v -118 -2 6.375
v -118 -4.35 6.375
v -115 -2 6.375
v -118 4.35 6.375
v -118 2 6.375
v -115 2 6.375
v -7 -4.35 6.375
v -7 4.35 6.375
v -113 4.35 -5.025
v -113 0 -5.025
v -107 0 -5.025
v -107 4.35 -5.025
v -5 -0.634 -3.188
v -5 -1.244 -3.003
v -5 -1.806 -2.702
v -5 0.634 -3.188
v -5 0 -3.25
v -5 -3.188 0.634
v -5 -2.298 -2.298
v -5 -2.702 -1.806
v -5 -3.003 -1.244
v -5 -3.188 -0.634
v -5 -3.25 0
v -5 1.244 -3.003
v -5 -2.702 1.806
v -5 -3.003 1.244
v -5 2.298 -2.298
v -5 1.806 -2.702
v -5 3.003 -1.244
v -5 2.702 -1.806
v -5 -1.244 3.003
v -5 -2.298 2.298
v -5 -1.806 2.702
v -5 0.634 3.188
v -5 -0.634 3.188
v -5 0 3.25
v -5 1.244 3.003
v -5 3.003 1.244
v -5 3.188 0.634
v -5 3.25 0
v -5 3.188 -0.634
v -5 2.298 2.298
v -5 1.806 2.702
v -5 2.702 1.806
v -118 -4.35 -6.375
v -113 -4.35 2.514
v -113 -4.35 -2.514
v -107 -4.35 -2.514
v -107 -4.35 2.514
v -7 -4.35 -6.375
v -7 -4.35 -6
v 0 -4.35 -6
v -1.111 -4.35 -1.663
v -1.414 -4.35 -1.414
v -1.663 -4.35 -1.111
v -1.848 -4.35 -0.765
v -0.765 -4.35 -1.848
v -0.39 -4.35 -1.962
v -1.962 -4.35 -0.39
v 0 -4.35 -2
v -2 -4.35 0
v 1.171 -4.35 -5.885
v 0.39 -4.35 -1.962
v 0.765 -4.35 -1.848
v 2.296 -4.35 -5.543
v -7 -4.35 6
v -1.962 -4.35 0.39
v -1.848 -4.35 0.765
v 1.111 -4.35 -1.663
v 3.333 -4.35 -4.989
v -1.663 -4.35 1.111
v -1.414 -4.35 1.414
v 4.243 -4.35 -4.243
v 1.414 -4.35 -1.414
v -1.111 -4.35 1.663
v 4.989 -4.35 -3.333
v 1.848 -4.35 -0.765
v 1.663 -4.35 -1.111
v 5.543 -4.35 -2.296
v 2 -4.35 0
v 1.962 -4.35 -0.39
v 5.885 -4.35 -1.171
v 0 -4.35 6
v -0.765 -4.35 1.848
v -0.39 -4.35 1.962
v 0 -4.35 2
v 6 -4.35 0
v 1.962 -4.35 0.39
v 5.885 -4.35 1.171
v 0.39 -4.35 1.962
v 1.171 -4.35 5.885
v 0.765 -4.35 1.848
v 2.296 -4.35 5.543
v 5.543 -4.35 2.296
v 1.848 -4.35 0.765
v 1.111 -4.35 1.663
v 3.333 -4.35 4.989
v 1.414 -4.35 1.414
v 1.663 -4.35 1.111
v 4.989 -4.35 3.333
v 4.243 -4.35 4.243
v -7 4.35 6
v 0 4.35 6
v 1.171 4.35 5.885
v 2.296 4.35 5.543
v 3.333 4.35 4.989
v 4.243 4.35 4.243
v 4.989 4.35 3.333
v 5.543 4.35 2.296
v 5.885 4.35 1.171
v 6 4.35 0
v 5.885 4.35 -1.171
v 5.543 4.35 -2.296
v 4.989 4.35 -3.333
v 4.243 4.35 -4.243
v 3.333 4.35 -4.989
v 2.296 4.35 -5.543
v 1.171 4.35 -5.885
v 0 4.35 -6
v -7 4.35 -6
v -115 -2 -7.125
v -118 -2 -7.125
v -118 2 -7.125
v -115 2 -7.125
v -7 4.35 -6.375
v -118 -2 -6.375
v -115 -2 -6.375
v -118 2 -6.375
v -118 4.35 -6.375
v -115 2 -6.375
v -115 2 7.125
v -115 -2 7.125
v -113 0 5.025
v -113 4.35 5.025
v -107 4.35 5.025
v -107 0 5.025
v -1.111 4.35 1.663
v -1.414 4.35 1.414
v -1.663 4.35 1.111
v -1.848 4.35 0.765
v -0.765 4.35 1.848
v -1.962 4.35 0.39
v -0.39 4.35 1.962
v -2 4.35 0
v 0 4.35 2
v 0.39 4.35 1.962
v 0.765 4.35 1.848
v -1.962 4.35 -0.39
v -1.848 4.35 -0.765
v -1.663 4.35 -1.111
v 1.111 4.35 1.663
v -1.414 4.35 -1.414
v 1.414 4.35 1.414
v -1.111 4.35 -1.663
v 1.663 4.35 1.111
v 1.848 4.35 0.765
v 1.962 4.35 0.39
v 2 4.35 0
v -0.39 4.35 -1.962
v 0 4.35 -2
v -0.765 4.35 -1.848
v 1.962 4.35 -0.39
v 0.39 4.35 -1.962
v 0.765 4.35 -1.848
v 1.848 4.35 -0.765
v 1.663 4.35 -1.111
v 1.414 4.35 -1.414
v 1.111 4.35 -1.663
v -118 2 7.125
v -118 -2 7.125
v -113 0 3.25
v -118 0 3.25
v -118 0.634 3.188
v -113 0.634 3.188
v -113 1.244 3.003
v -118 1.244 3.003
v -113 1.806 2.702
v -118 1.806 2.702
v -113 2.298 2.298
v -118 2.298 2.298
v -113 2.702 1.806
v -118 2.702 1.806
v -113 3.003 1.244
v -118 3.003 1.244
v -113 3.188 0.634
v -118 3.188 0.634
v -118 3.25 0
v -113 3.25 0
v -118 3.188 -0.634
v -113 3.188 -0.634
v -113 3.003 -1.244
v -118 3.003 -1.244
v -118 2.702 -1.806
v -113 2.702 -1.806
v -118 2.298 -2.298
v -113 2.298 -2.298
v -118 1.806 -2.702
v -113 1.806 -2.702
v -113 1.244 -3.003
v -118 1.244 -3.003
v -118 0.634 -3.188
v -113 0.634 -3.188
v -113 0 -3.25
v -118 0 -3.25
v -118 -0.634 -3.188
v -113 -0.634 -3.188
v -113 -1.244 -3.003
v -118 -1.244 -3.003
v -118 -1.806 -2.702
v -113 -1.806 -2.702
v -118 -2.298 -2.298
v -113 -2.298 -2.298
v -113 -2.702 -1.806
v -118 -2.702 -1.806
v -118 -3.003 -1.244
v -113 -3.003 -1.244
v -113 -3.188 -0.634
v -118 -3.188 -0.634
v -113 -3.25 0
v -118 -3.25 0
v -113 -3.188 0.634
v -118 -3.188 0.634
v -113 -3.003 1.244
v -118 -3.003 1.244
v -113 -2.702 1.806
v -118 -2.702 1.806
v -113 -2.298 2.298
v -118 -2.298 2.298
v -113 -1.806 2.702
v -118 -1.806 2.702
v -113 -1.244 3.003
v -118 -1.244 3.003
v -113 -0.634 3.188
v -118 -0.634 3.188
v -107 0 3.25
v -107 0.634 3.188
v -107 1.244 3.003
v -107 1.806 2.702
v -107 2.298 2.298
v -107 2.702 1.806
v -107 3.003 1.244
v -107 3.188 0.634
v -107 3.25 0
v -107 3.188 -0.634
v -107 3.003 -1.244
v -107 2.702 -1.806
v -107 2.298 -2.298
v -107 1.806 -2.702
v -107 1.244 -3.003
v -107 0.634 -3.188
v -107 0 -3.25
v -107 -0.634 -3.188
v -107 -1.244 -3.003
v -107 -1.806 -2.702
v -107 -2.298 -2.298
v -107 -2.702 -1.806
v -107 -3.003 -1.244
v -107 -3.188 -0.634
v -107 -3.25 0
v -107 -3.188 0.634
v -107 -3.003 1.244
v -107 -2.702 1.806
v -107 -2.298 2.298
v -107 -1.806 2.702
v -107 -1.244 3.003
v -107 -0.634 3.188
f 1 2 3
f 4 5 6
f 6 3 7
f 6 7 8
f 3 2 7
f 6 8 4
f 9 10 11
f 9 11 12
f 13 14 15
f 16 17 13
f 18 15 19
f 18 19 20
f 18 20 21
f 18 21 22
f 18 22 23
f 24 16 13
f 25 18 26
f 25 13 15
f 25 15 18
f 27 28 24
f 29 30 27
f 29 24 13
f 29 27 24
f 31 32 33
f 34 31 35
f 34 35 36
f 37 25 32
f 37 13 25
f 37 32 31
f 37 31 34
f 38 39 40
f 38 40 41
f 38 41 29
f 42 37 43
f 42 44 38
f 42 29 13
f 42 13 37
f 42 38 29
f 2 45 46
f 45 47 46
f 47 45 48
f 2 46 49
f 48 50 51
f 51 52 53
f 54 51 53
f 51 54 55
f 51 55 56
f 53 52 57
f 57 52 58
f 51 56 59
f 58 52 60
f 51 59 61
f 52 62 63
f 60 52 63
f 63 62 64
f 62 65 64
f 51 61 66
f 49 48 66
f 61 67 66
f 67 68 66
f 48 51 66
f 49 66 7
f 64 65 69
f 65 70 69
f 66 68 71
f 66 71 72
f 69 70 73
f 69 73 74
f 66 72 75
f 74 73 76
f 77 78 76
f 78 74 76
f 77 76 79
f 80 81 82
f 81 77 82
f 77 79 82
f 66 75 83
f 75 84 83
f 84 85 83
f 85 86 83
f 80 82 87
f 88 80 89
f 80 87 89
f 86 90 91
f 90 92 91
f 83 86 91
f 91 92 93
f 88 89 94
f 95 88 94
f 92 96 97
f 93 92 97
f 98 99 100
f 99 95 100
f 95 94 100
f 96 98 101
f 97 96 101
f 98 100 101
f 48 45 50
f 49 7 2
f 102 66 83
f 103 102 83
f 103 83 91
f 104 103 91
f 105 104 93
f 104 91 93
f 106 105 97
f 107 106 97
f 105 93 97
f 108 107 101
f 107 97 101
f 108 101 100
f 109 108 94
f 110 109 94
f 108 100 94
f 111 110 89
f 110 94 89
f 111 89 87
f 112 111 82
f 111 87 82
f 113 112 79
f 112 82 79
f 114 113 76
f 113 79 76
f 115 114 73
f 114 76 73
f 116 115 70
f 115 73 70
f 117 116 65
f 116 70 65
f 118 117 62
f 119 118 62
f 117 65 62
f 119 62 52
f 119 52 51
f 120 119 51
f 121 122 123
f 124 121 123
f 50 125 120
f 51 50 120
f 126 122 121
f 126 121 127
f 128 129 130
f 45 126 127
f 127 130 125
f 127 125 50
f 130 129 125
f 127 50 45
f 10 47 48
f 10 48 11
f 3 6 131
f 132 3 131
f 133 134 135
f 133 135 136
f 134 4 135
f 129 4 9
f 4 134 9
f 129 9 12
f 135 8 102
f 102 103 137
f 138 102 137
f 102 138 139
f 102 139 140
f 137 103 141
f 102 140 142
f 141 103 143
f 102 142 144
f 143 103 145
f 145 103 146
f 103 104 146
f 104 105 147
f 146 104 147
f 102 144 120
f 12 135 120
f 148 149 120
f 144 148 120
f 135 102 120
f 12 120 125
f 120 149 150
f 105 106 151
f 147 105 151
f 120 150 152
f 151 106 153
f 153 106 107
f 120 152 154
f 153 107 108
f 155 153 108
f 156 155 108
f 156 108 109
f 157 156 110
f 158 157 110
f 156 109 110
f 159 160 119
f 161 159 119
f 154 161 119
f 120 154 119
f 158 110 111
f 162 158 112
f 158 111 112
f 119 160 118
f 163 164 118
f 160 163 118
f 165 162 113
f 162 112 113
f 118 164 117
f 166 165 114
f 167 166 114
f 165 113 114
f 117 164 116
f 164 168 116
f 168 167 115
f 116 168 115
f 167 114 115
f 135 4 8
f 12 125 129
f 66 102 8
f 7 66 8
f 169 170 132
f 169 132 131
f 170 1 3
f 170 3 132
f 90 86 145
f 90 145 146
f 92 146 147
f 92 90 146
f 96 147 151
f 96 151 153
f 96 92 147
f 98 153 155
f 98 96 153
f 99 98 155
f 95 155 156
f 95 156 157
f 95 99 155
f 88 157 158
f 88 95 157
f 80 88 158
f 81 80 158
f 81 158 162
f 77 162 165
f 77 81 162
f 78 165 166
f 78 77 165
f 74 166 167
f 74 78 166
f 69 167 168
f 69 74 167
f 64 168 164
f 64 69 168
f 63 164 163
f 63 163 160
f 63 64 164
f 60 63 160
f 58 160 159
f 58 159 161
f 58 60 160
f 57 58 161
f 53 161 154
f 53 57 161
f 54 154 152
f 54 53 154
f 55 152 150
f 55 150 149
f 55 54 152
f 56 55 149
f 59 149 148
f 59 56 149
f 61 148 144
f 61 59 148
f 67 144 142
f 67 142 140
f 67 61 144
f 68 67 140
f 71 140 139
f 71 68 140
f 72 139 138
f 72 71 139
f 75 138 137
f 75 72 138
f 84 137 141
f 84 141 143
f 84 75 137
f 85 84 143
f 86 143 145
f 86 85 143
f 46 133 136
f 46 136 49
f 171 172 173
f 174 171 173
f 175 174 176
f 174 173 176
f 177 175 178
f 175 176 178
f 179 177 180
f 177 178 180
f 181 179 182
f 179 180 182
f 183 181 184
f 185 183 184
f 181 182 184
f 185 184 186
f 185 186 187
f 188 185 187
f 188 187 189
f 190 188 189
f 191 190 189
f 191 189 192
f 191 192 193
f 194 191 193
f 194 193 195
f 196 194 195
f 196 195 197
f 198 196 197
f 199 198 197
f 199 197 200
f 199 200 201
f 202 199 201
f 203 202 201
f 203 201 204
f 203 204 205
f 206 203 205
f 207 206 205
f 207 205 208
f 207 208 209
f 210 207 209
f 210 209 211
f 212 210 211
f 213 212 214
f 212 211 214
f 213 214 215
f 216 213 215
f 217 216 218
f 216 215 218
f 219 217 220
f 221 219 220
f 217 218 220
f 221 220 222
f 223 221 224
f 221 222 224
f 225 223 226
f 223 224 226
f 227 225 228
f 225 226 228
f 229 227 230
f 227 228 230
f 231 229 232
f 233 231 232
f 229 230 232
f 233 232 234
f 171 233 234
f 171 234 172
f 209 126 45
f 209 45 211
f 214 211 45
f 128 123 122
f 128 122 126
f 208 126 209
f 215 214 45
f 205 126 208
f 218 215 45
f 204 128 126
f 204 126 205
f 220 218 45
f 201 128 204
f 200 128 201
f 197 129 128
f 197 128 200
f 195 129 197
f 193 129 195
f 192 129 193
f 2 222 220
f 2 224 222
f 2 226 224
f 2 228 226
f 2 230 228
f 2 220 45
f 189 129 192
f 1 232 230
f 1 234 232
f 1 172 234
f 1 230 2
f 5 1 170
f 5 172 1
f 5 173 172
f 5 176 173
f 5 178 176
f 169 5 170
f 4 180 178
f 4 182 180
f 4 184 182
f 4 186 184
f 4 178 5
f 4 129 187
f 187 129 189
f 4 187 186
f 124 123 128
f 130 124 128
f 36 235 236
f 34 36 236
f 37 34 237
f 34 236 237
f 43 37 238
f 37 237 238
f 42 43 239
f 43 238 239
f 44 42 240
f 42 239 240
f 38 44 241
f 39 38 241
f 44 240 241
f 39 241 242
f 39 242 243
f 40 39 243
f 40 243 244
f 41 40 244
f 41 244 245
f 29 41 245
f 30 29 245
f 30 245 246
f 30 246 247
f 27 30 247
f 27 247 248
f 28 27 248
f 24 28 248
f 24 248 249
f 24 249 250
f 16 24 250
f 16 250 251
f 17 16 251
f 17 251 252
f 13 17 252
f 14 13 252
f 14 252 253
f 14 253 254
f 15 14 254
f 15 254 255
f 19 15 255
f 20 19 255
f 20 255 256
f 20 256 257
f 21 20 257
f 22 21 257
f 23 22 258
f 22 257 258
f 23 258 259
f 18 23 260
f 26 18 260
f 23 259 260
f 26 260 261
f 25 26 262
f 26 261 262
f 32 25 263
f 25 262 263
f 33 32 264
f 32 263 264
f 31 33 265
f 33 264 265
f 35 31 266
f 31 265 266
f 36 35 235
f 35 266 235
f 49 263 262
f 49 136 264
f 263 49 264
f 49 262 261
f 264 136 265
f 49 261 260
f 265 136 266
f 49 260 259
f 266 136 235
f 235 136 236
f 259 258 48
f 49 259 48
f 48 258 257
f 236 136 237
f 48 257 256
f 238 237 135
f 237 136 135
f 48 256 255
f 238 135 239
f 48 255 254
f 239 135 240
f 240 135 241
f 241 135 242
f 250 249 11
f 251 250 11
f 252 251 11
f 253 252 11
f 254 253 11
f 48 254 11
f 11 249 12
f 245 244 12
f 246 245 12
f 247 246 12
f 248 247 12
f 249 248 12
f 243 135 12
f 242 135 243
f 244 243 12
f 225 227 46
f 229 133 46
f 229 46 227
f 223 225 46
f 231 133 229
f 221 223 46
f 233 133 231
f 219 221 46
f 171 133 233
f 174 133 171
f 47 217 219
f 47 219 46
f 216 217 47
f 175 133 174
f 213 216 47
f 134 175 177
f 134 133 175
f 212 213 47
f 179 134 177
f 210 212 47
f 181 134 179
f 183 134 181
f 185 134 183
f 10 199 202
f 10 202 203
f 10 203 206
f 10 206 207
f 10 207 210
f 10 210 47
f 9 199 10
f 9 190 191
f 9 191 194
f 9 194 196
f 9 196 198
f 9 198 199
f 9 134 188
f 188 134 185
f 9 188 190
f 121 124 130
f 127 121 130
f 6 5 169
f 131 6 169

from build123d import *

# Parameters (mm, degrees)
BOSS_EXTRUDE1_DEPTH      = 4.35
BOSS_EXTRUDE1_DEPTH_BACK = 4.35
SKETCH3_R                = 2
BOSS_EXTRUDE2_DEPTH      = 111
SKETCH5_R                = 3.25
CUT_EXTRUDE1_DEPTH       = 113
CUT_EXTRUDE2_START       = -5
CUT_EXTRUDE2_DEPTH       = 6
SKETCH8_W                = 0.75
SKETCH8_H                = 4
BOSS_EXTRUDE4_DEPTH      = 3


with BuildPart() as part:
    # Sketch3 → Boss-Extrude1 (new, two sides: drawn at the far end of the back side and taken through both)
    with BuildSketch(Plane(origin=(0, 0, 0), x_dir=(1, 0, 0), z_dir=(0, 1, 0)).offset(-BOSS_EXTRUDE1_DEPTH_BACK)):
        with BuildLine():
            Line((0, 6), (-7, 6))
            Line((-7, 6), (-7, -6))
            Line((-7, -6), (0, -6))
            ThreePointArc((0, -6), (6, 0), (0, 6))
        make_face()
        Circle(SKETCH3_R, mode=Mode.SUBTRACT)
    extrude(amount=BOSS_EXTRUDE1_DEPTH + BOSS_EXTRUDE1_DEPTH_BACK)

    # Sketch4 → Boss-Extrude2 (add)
    with BuildSketch(Plane.ZY.offset(7)):
        Polygon((-6.375, -4.35), (6.375, -4.35), (6.375, 0.817855369), (6.375, 4.35), (-6.375, 4.35), (-6.375, -0.75), align=None)
    extrude(amount=BOSS_EXTRUDE2_DEPTH)

    # Sketch5 → Cut-Extrude1 (cut)
    with BuildSketch(Plane.ZY.offset(118)):
        Circle(SKETCH5_R)
    extrude(amount=-CUT_EXTRUDE1_DEPTH, mode=Mode.SUBTRACT)

    # Sketch6 → Cut-Extrude2 (cut)
    with BuildSketch(Plane.ZY.offset(118).offset(CUT_EXTRUDE2_START)):
        Polygon((-5.025, 0), (-5.025, 4.351777654), (-2.5125, 4.351777654), (2.5125, 4.351777654), (5.025, 4.351777654), (5.025, 0), (2.5125, -4.351777654), (-2.5125, -4.351777654), align=None)
    extrude(amount=-CUT_EXTRUDE2_DEPTH, mode=Mode.SUBTRACT)

    # Sketch8 → Boss-Extrude4 (add)
    with BuildSketch(Plane.ZY.offset(118)):
        with Locations((-6.75, 0)):
            Rectangle(SKETCH8_W, SKETCH8_H)
        with Locations((6.75, 0)):
            Rectangle(SKETCH8_W, SKETCH8_H)
    extrude(amount=-BOSS_EXTRUDE4_DEPTH)


solid = part.part
